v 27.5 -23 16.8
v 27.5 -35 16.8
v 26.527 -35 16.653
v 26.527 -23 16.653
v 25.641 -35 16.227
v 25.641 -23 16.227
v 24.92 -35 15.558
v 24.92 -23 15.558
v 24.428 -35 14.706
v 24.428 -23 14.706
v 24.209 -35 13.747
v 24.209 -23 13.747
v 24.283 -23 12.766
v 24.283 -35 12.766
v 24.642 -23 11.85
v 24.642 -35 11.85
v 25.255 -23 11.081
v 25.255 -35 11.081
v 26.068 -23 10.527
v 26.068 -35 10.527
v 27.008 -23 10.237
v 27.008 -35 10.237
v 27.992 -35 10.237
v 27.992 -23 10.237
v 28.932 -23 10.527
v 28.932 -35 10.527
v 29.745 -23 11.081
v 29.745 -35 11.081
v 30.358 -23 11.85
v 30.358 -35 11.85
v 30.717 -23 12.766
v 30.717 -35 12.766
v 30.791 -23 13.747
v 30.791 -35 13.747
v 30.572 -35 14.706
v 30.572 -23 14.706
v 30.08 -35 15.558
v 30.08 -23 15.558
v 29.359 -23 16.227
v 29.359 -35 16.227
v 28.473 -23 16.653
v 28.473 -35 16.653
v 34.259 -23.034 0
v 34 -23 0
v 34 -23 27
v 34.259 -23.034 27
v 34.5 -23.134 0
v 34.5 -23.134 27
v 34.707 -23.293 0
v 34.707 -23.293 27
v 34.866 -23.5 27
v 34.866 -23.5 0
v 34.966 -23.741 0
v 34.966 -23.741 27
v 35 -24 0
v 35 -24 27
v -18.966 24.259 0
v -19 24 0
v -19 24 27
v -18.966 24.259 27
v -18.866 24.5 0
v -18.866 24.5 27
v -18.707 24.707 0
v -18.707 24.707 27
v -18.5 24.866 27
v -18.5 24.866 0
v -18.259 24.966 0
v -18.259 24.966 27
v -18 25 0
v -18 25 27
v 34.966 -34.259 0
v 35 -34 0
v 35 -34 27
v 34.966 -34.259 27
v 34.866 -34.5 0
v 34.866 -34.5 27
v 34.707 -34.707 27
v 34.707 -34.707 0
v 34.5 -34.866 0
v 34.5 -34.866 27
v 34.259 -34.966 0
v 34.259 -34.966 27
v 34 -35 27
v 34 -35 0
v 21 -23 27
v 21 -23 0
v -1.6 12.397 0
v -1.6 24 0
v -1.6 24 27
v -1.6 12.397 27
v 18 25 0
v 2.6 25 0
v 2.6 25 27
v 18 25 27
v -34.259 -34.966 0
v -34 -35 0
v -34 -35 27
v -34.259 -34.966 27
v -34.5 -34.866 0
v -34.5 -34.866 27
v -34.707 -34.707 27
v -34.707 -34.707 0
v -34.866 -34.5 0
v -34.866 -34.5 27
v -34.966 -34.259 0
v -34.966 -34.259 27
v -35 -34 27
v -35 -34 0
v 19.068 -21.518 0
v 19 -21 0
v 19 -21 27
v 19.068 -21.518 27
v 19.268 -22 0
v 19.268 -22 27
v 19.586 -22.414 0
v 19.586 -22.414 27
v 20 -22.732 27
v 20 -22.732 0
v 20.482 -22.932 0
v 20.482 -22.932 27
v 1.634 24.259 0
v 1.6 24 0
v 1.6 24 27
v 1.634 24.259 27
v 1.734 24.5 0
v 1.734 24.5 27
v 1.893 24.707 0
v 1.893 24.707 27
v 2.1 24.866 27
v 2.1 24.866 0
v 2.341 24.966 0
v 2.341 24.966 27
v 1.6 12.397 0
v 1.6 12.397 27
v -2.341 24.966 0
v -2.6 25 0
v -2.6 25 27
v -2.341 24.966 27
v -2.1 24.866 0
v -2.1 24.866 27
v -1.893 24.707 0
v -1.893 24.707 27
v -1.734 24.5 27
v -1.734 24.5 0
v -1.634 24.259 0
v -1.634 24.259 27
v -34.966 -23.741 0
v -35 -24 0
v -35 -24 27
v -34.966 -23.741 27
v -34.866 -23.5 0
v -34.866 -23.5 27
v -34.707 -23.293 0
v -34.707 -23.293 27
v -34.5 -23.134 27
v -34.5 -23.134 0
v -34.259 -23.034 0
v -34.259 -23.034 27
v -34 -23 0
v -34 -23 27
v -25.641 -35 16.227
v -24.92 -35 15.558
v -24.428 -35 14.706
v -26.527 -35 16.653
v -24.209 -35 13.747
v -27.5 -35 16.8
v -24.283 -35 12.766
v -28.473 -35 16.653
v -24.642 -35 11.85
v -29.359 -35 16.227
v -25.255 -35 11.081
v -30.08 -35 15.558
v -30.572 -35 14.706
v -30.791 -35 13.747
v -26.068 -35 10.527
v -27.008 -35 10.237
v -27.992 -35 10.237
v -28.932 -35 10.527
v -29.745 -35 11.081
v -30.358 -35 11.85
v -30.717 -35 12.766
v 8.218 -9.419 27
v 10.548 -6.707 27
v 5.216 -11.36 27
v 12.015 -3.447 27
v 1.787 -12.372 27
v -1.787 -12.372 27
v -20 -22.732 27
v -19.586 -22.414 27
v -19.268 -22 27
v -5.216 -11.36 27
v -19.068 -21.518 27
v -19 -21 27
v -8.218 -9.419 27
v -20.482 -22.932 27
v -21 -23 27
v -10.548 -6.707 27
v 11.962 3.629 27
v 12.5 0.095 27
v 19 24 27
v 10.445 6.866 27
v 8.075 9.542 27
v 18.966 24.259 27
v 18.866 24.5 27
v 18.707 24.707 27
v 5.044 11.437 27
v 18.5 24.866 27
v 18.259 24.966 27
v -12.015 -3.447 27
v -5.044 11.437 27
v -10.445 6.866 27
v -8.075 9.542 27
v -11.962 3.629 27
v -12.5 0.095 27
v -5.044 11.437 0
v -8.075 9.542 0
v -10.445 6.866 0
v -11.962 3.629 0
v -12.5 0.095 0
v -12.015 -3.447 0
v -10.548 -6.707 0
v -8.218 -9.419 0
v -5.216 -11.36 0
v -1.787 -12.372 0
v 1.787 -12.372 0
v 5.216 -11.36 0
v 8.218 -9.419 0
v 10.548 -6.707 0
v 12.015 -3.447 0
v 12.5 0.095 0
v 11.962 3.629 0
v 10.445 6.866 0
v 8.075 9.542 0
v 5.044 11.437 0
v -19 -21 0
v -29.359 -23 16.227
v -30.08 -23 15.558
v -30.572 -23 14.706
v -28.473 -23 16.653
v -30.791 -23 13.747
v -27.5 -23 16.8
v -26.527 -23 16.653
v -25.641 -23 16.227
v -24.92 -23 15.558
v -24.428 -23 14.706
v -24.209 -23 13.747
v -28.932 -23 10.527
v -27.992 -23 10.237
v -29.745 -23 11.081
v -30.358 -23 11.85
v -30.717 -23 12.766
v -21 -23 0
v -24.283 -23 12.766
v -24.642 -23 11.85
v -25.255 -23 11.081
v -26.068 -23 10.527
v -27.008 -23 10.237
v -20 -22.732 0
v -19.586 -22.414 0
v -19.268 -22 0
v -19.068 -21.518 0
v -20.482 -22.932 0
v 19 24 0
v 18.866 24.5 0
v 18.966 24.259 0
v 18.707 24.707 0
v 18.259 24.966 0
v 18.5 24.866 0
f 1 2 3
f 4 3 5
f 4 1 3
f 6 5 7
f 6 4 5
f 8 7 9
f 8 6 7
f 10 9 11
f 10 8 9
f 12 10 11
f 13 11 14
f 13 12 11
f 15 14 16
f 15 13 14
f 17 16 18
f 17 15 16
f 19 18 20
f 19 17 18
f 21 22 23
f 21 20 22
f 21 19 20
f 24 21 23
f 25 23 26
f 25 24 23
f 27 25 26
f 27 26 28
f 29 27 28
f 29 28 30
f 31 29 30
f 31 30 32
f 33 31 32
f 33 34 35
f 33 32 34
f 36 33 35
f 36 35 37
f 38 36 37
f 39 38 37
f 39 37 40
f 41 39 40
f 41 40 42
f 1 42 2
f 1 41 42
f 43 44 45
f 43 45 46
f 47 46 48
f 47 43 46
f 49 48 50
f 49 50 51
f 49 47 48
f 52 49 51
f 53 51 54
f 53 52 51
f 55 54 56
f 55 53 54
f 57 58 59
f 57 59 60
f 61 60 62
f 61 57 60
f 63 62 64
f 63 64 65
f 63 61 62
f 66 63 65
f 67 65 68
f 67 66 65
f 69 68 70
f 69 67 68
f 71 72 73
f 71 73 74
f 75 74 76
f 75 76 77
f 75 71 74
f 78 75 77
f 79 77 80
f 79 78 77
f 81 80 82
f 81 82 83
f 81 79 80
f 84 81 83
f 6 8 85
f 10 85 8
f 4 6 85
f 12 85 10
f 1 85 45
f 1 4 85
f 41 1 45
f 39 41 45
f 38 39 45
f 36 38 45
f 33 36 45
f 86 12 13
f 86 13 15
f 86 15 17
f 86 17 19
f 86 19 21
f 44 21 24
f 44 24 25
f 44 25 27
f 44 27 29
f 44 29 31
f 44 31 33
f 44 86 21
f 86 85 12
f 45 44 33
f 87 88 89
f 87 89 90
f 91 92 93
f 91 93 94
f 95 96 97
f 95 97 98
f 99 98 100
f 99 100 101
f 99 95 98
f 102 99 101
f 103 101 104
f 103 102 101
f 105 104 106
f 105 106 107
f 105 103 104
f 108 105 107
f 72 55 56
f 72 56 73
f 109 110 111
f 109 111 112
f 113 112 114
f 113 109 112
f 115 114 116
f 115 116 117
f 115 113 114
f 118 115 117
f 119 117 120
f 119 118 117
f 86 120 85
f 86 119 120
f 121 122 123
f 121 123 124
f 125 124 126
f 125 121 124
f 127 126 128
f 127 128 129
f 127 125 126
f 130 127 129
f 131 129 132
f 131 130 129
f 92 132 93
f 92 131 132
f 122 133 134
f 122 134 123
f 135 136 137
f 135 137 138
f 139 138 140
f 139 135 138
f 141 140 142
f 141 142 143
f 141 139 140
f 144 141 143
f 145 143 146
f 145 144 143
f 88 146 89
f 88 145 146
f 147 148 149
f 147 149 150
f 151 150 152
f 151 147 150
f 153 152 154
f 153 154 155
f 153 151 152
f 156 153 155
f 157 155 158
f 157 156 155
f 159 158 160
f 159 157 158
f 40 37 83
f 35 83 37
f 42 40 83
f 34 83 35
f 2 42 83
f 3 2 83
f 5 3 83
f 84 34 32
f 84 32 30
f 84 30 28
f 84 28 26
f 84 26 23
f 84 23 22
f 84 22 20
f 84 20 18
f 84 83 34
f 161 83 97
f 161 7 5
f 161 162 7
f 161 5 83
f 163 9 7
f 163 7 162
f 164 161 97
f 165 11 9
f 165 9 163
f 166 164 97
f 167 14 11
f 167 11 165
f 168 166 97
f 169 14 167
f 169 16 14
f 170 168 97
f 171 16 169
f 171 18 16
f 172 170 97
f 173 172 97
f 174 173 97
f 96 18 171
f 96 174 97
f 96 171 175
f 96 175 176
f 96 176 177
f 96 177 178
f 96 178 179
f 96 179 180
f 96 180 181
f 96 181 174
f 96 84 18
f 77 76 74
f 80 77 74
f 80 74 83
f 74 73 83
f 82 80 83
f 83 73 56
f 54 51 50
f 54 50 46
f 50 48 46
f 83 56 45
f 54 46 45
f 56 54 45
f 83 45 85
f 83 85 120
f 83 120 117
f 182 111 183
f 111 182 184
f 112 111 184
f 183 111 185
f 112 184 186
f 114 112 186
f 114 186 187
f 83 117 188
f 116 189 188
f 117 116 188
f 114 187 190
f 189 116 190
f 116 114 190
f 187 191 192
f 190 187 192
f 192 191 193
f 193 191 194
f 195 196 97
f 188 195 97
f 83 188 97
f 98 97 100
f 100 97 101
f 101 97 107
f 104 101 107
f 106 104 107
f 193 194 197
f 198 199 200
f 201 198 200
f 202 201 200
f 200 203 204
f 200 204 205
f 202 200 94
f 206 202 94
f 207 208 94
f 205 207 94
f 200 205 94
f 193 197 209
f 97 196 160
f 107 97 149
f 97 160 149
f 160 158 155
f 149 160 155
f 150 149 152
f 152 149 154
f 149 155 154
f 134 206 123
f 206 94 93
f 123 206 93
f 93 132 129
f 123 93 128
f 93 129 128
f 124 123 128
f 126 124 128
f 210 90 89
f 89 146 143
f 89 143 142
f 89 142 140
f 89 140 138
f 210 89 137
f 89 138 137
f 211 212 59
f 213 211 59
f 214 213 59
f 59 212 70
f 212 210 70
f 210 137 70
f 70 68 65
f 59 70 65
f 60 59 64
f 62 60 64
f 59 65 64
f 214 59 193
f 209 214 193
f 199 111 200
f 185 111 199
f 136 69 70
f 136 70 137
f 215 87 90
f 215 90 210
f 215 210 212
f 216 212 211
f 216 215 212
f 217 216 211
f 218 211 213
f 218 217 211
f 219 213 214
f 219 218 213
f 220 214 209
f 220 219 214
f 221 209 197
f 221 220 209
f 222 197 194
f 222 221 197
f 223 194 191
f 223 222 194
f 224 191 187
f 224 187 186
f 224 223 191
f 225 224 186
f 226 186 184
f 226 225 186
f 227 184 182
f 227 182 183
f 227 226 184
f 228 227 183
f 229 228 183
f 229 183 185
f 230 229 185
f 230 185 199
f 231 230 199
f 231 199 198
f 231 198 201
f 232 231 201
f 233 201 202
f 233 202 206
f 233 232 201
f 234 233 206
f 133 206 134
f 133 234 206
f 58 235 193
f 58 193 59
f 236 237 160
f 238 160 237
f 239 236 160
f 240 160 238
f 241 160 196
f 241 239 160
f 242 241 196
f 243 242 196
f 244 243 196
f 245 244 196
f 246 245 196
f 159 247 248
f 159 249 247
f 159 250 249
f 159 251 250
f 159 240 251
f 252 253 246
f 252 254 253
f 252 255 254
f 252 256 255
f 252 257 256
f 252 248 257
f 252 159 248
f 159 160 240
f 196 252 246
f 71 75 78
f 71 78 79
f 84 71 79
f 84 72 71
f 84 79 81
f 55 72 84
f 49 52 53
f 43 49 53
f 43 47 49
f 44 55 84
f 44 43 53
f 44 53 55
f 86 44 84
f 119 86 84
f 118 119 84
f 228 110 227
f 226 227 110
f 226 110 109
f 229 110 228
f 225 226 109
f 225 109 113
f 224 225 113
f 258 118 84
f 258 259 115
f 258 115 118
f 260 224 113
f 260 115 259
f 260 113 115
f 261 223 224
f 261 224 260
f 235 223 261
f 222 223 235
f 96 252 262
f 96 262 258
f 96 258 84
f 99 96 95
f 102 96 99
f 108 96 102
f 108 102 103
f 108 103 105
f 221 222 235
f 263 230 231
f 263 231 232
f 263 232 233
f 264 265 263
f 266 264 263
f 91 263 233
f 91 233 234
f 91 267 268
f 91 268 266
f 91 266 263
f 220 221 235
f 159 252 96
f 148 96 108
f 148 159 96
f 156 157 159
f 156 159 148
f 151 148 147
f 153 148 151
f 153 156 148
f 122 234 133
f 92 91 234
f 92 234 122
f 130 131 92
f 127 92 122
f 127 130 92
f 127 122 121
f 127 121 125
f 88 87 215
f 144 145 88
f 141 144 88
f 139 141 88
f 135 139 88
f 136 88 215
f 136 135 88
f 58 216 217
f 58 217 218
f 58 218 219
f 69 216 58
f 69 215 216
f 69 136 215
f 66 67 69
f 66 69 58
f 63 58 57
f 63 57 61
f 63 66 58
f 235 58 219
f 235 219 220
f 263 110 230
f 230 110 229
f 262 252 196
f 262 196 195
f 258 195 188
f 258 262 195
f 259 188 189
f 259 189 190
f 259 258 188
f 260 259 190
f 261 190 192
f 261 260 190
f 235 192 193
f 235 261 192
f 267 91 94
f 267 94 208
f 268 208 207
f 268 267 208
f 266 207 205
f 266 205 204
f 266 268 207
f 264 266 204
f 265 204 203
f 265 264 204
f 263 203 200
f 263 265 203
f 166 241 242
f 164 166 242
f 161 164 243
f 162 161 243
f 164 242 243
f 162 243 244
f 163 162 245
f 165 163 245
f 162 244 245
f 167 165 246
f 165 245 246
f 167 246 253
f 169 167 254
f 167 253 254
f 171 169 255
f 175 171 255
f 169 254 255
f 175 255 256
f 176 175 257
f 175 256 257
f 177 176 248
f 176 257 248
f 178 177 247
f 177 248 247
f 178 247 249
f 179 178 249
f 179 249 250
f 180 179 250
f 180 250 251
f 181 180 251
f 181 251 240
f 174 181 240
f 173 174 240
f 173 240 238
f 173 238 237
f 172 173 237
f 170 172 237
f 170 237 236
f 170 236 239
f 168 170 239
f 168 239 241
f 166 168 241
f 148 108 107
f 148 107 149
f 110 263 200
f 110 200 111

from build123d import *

# Parameters (mm, degrees)
BOSS_EXTRUDE1_DEPTH = 27
SKETCH2_R           = 3.3
CUT_EXTRUDE1_DEPTH  = 66.253352404


with BuildPart() as part:
    # Sketch1 → Boss-Extrude1 (new body)
    with BuildSketch(Plane.XY):
        with BuildLine():
            Line((-35, -34), (-35, -24))
            ThreePointArc((-35, -24), (-34.707106781, -23.292893219), (-34, -23))
            Line((-34, -23), (-21, -23))
            ThreePointArc((-21, -23), (-19.585786438, -22.414213562), (-19, -21))
            Line((-19, -21), (-19, 24))
            ThreePointArc((-19, 24), (-18.707106781, 24.707106781), (-18, 25))
            Line((-18, 25), (-2.6, 25))
            ThreePointArc((-2.6, 25), (-1.892893219, 24.707106781), (-1.6, 24))
            Line((-1.6, 24), (-1.6, 12.397177098))
            ThreePointArc((-1.6, 12.397177098), (0, -12.5), (1.6, 12.397177098))
            Line((1.6, 12.397177098), (1.6, 24))
            ThreePointArc((1.6, 24), (1.892893219, 24.707106781), (2.6, 25))
            Line((2.6, 25), (18, 25))
            ThreePointArc((18, 25), (18.707106781, 24.707106781), (19, 24))
            Line((19, 24), (19, -21))
            ThreePointArc((19, -21), (19.585786438, -22.414213562), (21, -23))
            Line((21, -23), (34, -23))
            ThreePointArc((34, -23), (34.707106781, -23.292893219), (35, -24))
            Line((35, -24), (35, -34))
            ThreePointArc((35, -34), (34.707106781, -34.707106781), (34, -35))
            Line((34, -35), (-34, -35))
            ThreePointArc((-34, -35), (-34.707106781, -34.707106781), (-35, -34))
        make_face()
    extrude(amount=BOSS_EXTRUDE1_DEPTH)

    # Sketch2 → Cut-Extrude1 (cut, through all)
    with BuildSketch(Plane(origin=(0, -23, 0), x_dir=(1, 0, 0), z_dir=(0, 1, 0))):
        with Locations(Location((-27.5, -13.5, 0), (0, 0, 270))):
            Circle(SKETCH2_R)
    cut_extrude1 = extrude(amount=-CUT_EXTRUDE1_DEPTH, mode=Mode.SUBTRACT)

    # Mirror1: Cut-Extrude1 across plane
    add(cut_extrude1.mirror(Plane(origin=(0, 0, 0), x_dir=(0, 0, 1), z_dir=(1, 0, 0))), mode=Mode.SUBTRACT)


solid = part.part
